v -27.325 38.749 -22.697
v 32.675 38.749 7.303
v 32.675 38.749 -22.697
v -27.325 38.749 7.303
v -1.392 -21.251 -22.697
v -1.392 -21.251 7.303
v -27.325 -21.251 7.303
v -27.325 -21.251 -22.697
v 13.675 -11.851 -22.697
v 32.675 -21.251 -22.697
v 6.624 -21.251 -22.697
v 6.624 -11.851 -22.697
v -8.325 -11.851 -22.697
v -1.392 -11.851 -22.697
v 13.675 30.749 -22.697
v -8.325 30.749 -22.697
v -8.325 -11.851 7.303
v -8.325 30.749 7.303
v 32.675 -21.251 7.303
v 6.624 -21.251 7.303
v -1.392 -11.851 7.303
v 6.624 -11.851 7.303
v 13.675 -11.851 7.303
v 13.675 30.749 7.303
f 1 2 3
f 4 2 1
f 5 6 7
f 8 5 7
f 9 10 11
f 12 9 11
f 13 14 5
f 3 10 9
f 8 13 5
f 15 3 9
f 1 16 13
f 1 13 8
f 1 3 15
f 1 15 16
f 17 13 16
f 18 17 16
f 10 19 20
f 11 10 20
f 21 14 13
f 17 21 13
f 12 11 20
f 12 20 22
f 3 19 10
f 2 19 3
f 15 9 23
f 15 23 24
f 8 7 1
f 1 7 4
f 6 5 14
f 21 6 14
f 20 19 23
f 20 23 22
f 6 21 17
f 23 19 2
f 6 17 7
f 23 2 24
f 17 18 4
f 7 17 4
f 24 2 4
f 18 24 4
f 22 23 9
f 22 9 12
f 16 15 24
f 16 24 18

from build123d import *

# Parameters (mm, degrees)
SKETCH1_W           = 60
SKETCH1_H           = 60
BOSS_EXTRUDE1_DEPTH = 30
SKETCH2_W           = 22
SKETCH2_H           = 42.6
CUT_EXTRUDE1_DEPTH  = 59.89947825
SKETCH4_W           = 8.015676437
SKETCH4_H           = 9.4
CUT_EXTRUDE3_DEPTH  = 59.89947825


with BuildPart() as part:
    # Sketch1 → Boss-Extrude1 (new body)
    with BuildSketch(Plane(origin=(0, 0, 7.302957559), x_dir=(-1, 0, 0), z_dir=(0, 0, -1))):
        with Locations((-2.674729751, 8.74932998)):
            Rectangle(SKETCH1_W, SKETCH1_H)
    extrude(amount=BOSS_EXTRUDE1_DEPTH)

    # Sketch2 → Cut-Extrude1 (cut, through all)
    with BuildSketch(Plane(origin=(0, 0, -22.697042441), x_dir=(-1, 0, 0), z_dir=(0, 0, -1))):
        with Locations((-2.674729751, 9.44932998)):
            Rectangle(SKETCH2_W, SKETCH2_H)
    extrude(amount=-CUT_EXTRUDE1_DEPTH, mode=Mode.SUBTRACT)

    # Sketch4 → Cut-Extrude3 (cut, through all)
    with BuildSketch(Plane(origin=(0, 0, -22.697042441), x_dir=(-1, 0, 0), z_dir=(0, 0, -1))):
        with Locations((-2.616126324, -16.55067002)):
            Rectangle(SKETCH4_W, SKETCH4_H)
    extrude(amount=-CUT_EXTRUDE3_DEPTH, mode=Mode.SUBTRACT)


solid = part.part
